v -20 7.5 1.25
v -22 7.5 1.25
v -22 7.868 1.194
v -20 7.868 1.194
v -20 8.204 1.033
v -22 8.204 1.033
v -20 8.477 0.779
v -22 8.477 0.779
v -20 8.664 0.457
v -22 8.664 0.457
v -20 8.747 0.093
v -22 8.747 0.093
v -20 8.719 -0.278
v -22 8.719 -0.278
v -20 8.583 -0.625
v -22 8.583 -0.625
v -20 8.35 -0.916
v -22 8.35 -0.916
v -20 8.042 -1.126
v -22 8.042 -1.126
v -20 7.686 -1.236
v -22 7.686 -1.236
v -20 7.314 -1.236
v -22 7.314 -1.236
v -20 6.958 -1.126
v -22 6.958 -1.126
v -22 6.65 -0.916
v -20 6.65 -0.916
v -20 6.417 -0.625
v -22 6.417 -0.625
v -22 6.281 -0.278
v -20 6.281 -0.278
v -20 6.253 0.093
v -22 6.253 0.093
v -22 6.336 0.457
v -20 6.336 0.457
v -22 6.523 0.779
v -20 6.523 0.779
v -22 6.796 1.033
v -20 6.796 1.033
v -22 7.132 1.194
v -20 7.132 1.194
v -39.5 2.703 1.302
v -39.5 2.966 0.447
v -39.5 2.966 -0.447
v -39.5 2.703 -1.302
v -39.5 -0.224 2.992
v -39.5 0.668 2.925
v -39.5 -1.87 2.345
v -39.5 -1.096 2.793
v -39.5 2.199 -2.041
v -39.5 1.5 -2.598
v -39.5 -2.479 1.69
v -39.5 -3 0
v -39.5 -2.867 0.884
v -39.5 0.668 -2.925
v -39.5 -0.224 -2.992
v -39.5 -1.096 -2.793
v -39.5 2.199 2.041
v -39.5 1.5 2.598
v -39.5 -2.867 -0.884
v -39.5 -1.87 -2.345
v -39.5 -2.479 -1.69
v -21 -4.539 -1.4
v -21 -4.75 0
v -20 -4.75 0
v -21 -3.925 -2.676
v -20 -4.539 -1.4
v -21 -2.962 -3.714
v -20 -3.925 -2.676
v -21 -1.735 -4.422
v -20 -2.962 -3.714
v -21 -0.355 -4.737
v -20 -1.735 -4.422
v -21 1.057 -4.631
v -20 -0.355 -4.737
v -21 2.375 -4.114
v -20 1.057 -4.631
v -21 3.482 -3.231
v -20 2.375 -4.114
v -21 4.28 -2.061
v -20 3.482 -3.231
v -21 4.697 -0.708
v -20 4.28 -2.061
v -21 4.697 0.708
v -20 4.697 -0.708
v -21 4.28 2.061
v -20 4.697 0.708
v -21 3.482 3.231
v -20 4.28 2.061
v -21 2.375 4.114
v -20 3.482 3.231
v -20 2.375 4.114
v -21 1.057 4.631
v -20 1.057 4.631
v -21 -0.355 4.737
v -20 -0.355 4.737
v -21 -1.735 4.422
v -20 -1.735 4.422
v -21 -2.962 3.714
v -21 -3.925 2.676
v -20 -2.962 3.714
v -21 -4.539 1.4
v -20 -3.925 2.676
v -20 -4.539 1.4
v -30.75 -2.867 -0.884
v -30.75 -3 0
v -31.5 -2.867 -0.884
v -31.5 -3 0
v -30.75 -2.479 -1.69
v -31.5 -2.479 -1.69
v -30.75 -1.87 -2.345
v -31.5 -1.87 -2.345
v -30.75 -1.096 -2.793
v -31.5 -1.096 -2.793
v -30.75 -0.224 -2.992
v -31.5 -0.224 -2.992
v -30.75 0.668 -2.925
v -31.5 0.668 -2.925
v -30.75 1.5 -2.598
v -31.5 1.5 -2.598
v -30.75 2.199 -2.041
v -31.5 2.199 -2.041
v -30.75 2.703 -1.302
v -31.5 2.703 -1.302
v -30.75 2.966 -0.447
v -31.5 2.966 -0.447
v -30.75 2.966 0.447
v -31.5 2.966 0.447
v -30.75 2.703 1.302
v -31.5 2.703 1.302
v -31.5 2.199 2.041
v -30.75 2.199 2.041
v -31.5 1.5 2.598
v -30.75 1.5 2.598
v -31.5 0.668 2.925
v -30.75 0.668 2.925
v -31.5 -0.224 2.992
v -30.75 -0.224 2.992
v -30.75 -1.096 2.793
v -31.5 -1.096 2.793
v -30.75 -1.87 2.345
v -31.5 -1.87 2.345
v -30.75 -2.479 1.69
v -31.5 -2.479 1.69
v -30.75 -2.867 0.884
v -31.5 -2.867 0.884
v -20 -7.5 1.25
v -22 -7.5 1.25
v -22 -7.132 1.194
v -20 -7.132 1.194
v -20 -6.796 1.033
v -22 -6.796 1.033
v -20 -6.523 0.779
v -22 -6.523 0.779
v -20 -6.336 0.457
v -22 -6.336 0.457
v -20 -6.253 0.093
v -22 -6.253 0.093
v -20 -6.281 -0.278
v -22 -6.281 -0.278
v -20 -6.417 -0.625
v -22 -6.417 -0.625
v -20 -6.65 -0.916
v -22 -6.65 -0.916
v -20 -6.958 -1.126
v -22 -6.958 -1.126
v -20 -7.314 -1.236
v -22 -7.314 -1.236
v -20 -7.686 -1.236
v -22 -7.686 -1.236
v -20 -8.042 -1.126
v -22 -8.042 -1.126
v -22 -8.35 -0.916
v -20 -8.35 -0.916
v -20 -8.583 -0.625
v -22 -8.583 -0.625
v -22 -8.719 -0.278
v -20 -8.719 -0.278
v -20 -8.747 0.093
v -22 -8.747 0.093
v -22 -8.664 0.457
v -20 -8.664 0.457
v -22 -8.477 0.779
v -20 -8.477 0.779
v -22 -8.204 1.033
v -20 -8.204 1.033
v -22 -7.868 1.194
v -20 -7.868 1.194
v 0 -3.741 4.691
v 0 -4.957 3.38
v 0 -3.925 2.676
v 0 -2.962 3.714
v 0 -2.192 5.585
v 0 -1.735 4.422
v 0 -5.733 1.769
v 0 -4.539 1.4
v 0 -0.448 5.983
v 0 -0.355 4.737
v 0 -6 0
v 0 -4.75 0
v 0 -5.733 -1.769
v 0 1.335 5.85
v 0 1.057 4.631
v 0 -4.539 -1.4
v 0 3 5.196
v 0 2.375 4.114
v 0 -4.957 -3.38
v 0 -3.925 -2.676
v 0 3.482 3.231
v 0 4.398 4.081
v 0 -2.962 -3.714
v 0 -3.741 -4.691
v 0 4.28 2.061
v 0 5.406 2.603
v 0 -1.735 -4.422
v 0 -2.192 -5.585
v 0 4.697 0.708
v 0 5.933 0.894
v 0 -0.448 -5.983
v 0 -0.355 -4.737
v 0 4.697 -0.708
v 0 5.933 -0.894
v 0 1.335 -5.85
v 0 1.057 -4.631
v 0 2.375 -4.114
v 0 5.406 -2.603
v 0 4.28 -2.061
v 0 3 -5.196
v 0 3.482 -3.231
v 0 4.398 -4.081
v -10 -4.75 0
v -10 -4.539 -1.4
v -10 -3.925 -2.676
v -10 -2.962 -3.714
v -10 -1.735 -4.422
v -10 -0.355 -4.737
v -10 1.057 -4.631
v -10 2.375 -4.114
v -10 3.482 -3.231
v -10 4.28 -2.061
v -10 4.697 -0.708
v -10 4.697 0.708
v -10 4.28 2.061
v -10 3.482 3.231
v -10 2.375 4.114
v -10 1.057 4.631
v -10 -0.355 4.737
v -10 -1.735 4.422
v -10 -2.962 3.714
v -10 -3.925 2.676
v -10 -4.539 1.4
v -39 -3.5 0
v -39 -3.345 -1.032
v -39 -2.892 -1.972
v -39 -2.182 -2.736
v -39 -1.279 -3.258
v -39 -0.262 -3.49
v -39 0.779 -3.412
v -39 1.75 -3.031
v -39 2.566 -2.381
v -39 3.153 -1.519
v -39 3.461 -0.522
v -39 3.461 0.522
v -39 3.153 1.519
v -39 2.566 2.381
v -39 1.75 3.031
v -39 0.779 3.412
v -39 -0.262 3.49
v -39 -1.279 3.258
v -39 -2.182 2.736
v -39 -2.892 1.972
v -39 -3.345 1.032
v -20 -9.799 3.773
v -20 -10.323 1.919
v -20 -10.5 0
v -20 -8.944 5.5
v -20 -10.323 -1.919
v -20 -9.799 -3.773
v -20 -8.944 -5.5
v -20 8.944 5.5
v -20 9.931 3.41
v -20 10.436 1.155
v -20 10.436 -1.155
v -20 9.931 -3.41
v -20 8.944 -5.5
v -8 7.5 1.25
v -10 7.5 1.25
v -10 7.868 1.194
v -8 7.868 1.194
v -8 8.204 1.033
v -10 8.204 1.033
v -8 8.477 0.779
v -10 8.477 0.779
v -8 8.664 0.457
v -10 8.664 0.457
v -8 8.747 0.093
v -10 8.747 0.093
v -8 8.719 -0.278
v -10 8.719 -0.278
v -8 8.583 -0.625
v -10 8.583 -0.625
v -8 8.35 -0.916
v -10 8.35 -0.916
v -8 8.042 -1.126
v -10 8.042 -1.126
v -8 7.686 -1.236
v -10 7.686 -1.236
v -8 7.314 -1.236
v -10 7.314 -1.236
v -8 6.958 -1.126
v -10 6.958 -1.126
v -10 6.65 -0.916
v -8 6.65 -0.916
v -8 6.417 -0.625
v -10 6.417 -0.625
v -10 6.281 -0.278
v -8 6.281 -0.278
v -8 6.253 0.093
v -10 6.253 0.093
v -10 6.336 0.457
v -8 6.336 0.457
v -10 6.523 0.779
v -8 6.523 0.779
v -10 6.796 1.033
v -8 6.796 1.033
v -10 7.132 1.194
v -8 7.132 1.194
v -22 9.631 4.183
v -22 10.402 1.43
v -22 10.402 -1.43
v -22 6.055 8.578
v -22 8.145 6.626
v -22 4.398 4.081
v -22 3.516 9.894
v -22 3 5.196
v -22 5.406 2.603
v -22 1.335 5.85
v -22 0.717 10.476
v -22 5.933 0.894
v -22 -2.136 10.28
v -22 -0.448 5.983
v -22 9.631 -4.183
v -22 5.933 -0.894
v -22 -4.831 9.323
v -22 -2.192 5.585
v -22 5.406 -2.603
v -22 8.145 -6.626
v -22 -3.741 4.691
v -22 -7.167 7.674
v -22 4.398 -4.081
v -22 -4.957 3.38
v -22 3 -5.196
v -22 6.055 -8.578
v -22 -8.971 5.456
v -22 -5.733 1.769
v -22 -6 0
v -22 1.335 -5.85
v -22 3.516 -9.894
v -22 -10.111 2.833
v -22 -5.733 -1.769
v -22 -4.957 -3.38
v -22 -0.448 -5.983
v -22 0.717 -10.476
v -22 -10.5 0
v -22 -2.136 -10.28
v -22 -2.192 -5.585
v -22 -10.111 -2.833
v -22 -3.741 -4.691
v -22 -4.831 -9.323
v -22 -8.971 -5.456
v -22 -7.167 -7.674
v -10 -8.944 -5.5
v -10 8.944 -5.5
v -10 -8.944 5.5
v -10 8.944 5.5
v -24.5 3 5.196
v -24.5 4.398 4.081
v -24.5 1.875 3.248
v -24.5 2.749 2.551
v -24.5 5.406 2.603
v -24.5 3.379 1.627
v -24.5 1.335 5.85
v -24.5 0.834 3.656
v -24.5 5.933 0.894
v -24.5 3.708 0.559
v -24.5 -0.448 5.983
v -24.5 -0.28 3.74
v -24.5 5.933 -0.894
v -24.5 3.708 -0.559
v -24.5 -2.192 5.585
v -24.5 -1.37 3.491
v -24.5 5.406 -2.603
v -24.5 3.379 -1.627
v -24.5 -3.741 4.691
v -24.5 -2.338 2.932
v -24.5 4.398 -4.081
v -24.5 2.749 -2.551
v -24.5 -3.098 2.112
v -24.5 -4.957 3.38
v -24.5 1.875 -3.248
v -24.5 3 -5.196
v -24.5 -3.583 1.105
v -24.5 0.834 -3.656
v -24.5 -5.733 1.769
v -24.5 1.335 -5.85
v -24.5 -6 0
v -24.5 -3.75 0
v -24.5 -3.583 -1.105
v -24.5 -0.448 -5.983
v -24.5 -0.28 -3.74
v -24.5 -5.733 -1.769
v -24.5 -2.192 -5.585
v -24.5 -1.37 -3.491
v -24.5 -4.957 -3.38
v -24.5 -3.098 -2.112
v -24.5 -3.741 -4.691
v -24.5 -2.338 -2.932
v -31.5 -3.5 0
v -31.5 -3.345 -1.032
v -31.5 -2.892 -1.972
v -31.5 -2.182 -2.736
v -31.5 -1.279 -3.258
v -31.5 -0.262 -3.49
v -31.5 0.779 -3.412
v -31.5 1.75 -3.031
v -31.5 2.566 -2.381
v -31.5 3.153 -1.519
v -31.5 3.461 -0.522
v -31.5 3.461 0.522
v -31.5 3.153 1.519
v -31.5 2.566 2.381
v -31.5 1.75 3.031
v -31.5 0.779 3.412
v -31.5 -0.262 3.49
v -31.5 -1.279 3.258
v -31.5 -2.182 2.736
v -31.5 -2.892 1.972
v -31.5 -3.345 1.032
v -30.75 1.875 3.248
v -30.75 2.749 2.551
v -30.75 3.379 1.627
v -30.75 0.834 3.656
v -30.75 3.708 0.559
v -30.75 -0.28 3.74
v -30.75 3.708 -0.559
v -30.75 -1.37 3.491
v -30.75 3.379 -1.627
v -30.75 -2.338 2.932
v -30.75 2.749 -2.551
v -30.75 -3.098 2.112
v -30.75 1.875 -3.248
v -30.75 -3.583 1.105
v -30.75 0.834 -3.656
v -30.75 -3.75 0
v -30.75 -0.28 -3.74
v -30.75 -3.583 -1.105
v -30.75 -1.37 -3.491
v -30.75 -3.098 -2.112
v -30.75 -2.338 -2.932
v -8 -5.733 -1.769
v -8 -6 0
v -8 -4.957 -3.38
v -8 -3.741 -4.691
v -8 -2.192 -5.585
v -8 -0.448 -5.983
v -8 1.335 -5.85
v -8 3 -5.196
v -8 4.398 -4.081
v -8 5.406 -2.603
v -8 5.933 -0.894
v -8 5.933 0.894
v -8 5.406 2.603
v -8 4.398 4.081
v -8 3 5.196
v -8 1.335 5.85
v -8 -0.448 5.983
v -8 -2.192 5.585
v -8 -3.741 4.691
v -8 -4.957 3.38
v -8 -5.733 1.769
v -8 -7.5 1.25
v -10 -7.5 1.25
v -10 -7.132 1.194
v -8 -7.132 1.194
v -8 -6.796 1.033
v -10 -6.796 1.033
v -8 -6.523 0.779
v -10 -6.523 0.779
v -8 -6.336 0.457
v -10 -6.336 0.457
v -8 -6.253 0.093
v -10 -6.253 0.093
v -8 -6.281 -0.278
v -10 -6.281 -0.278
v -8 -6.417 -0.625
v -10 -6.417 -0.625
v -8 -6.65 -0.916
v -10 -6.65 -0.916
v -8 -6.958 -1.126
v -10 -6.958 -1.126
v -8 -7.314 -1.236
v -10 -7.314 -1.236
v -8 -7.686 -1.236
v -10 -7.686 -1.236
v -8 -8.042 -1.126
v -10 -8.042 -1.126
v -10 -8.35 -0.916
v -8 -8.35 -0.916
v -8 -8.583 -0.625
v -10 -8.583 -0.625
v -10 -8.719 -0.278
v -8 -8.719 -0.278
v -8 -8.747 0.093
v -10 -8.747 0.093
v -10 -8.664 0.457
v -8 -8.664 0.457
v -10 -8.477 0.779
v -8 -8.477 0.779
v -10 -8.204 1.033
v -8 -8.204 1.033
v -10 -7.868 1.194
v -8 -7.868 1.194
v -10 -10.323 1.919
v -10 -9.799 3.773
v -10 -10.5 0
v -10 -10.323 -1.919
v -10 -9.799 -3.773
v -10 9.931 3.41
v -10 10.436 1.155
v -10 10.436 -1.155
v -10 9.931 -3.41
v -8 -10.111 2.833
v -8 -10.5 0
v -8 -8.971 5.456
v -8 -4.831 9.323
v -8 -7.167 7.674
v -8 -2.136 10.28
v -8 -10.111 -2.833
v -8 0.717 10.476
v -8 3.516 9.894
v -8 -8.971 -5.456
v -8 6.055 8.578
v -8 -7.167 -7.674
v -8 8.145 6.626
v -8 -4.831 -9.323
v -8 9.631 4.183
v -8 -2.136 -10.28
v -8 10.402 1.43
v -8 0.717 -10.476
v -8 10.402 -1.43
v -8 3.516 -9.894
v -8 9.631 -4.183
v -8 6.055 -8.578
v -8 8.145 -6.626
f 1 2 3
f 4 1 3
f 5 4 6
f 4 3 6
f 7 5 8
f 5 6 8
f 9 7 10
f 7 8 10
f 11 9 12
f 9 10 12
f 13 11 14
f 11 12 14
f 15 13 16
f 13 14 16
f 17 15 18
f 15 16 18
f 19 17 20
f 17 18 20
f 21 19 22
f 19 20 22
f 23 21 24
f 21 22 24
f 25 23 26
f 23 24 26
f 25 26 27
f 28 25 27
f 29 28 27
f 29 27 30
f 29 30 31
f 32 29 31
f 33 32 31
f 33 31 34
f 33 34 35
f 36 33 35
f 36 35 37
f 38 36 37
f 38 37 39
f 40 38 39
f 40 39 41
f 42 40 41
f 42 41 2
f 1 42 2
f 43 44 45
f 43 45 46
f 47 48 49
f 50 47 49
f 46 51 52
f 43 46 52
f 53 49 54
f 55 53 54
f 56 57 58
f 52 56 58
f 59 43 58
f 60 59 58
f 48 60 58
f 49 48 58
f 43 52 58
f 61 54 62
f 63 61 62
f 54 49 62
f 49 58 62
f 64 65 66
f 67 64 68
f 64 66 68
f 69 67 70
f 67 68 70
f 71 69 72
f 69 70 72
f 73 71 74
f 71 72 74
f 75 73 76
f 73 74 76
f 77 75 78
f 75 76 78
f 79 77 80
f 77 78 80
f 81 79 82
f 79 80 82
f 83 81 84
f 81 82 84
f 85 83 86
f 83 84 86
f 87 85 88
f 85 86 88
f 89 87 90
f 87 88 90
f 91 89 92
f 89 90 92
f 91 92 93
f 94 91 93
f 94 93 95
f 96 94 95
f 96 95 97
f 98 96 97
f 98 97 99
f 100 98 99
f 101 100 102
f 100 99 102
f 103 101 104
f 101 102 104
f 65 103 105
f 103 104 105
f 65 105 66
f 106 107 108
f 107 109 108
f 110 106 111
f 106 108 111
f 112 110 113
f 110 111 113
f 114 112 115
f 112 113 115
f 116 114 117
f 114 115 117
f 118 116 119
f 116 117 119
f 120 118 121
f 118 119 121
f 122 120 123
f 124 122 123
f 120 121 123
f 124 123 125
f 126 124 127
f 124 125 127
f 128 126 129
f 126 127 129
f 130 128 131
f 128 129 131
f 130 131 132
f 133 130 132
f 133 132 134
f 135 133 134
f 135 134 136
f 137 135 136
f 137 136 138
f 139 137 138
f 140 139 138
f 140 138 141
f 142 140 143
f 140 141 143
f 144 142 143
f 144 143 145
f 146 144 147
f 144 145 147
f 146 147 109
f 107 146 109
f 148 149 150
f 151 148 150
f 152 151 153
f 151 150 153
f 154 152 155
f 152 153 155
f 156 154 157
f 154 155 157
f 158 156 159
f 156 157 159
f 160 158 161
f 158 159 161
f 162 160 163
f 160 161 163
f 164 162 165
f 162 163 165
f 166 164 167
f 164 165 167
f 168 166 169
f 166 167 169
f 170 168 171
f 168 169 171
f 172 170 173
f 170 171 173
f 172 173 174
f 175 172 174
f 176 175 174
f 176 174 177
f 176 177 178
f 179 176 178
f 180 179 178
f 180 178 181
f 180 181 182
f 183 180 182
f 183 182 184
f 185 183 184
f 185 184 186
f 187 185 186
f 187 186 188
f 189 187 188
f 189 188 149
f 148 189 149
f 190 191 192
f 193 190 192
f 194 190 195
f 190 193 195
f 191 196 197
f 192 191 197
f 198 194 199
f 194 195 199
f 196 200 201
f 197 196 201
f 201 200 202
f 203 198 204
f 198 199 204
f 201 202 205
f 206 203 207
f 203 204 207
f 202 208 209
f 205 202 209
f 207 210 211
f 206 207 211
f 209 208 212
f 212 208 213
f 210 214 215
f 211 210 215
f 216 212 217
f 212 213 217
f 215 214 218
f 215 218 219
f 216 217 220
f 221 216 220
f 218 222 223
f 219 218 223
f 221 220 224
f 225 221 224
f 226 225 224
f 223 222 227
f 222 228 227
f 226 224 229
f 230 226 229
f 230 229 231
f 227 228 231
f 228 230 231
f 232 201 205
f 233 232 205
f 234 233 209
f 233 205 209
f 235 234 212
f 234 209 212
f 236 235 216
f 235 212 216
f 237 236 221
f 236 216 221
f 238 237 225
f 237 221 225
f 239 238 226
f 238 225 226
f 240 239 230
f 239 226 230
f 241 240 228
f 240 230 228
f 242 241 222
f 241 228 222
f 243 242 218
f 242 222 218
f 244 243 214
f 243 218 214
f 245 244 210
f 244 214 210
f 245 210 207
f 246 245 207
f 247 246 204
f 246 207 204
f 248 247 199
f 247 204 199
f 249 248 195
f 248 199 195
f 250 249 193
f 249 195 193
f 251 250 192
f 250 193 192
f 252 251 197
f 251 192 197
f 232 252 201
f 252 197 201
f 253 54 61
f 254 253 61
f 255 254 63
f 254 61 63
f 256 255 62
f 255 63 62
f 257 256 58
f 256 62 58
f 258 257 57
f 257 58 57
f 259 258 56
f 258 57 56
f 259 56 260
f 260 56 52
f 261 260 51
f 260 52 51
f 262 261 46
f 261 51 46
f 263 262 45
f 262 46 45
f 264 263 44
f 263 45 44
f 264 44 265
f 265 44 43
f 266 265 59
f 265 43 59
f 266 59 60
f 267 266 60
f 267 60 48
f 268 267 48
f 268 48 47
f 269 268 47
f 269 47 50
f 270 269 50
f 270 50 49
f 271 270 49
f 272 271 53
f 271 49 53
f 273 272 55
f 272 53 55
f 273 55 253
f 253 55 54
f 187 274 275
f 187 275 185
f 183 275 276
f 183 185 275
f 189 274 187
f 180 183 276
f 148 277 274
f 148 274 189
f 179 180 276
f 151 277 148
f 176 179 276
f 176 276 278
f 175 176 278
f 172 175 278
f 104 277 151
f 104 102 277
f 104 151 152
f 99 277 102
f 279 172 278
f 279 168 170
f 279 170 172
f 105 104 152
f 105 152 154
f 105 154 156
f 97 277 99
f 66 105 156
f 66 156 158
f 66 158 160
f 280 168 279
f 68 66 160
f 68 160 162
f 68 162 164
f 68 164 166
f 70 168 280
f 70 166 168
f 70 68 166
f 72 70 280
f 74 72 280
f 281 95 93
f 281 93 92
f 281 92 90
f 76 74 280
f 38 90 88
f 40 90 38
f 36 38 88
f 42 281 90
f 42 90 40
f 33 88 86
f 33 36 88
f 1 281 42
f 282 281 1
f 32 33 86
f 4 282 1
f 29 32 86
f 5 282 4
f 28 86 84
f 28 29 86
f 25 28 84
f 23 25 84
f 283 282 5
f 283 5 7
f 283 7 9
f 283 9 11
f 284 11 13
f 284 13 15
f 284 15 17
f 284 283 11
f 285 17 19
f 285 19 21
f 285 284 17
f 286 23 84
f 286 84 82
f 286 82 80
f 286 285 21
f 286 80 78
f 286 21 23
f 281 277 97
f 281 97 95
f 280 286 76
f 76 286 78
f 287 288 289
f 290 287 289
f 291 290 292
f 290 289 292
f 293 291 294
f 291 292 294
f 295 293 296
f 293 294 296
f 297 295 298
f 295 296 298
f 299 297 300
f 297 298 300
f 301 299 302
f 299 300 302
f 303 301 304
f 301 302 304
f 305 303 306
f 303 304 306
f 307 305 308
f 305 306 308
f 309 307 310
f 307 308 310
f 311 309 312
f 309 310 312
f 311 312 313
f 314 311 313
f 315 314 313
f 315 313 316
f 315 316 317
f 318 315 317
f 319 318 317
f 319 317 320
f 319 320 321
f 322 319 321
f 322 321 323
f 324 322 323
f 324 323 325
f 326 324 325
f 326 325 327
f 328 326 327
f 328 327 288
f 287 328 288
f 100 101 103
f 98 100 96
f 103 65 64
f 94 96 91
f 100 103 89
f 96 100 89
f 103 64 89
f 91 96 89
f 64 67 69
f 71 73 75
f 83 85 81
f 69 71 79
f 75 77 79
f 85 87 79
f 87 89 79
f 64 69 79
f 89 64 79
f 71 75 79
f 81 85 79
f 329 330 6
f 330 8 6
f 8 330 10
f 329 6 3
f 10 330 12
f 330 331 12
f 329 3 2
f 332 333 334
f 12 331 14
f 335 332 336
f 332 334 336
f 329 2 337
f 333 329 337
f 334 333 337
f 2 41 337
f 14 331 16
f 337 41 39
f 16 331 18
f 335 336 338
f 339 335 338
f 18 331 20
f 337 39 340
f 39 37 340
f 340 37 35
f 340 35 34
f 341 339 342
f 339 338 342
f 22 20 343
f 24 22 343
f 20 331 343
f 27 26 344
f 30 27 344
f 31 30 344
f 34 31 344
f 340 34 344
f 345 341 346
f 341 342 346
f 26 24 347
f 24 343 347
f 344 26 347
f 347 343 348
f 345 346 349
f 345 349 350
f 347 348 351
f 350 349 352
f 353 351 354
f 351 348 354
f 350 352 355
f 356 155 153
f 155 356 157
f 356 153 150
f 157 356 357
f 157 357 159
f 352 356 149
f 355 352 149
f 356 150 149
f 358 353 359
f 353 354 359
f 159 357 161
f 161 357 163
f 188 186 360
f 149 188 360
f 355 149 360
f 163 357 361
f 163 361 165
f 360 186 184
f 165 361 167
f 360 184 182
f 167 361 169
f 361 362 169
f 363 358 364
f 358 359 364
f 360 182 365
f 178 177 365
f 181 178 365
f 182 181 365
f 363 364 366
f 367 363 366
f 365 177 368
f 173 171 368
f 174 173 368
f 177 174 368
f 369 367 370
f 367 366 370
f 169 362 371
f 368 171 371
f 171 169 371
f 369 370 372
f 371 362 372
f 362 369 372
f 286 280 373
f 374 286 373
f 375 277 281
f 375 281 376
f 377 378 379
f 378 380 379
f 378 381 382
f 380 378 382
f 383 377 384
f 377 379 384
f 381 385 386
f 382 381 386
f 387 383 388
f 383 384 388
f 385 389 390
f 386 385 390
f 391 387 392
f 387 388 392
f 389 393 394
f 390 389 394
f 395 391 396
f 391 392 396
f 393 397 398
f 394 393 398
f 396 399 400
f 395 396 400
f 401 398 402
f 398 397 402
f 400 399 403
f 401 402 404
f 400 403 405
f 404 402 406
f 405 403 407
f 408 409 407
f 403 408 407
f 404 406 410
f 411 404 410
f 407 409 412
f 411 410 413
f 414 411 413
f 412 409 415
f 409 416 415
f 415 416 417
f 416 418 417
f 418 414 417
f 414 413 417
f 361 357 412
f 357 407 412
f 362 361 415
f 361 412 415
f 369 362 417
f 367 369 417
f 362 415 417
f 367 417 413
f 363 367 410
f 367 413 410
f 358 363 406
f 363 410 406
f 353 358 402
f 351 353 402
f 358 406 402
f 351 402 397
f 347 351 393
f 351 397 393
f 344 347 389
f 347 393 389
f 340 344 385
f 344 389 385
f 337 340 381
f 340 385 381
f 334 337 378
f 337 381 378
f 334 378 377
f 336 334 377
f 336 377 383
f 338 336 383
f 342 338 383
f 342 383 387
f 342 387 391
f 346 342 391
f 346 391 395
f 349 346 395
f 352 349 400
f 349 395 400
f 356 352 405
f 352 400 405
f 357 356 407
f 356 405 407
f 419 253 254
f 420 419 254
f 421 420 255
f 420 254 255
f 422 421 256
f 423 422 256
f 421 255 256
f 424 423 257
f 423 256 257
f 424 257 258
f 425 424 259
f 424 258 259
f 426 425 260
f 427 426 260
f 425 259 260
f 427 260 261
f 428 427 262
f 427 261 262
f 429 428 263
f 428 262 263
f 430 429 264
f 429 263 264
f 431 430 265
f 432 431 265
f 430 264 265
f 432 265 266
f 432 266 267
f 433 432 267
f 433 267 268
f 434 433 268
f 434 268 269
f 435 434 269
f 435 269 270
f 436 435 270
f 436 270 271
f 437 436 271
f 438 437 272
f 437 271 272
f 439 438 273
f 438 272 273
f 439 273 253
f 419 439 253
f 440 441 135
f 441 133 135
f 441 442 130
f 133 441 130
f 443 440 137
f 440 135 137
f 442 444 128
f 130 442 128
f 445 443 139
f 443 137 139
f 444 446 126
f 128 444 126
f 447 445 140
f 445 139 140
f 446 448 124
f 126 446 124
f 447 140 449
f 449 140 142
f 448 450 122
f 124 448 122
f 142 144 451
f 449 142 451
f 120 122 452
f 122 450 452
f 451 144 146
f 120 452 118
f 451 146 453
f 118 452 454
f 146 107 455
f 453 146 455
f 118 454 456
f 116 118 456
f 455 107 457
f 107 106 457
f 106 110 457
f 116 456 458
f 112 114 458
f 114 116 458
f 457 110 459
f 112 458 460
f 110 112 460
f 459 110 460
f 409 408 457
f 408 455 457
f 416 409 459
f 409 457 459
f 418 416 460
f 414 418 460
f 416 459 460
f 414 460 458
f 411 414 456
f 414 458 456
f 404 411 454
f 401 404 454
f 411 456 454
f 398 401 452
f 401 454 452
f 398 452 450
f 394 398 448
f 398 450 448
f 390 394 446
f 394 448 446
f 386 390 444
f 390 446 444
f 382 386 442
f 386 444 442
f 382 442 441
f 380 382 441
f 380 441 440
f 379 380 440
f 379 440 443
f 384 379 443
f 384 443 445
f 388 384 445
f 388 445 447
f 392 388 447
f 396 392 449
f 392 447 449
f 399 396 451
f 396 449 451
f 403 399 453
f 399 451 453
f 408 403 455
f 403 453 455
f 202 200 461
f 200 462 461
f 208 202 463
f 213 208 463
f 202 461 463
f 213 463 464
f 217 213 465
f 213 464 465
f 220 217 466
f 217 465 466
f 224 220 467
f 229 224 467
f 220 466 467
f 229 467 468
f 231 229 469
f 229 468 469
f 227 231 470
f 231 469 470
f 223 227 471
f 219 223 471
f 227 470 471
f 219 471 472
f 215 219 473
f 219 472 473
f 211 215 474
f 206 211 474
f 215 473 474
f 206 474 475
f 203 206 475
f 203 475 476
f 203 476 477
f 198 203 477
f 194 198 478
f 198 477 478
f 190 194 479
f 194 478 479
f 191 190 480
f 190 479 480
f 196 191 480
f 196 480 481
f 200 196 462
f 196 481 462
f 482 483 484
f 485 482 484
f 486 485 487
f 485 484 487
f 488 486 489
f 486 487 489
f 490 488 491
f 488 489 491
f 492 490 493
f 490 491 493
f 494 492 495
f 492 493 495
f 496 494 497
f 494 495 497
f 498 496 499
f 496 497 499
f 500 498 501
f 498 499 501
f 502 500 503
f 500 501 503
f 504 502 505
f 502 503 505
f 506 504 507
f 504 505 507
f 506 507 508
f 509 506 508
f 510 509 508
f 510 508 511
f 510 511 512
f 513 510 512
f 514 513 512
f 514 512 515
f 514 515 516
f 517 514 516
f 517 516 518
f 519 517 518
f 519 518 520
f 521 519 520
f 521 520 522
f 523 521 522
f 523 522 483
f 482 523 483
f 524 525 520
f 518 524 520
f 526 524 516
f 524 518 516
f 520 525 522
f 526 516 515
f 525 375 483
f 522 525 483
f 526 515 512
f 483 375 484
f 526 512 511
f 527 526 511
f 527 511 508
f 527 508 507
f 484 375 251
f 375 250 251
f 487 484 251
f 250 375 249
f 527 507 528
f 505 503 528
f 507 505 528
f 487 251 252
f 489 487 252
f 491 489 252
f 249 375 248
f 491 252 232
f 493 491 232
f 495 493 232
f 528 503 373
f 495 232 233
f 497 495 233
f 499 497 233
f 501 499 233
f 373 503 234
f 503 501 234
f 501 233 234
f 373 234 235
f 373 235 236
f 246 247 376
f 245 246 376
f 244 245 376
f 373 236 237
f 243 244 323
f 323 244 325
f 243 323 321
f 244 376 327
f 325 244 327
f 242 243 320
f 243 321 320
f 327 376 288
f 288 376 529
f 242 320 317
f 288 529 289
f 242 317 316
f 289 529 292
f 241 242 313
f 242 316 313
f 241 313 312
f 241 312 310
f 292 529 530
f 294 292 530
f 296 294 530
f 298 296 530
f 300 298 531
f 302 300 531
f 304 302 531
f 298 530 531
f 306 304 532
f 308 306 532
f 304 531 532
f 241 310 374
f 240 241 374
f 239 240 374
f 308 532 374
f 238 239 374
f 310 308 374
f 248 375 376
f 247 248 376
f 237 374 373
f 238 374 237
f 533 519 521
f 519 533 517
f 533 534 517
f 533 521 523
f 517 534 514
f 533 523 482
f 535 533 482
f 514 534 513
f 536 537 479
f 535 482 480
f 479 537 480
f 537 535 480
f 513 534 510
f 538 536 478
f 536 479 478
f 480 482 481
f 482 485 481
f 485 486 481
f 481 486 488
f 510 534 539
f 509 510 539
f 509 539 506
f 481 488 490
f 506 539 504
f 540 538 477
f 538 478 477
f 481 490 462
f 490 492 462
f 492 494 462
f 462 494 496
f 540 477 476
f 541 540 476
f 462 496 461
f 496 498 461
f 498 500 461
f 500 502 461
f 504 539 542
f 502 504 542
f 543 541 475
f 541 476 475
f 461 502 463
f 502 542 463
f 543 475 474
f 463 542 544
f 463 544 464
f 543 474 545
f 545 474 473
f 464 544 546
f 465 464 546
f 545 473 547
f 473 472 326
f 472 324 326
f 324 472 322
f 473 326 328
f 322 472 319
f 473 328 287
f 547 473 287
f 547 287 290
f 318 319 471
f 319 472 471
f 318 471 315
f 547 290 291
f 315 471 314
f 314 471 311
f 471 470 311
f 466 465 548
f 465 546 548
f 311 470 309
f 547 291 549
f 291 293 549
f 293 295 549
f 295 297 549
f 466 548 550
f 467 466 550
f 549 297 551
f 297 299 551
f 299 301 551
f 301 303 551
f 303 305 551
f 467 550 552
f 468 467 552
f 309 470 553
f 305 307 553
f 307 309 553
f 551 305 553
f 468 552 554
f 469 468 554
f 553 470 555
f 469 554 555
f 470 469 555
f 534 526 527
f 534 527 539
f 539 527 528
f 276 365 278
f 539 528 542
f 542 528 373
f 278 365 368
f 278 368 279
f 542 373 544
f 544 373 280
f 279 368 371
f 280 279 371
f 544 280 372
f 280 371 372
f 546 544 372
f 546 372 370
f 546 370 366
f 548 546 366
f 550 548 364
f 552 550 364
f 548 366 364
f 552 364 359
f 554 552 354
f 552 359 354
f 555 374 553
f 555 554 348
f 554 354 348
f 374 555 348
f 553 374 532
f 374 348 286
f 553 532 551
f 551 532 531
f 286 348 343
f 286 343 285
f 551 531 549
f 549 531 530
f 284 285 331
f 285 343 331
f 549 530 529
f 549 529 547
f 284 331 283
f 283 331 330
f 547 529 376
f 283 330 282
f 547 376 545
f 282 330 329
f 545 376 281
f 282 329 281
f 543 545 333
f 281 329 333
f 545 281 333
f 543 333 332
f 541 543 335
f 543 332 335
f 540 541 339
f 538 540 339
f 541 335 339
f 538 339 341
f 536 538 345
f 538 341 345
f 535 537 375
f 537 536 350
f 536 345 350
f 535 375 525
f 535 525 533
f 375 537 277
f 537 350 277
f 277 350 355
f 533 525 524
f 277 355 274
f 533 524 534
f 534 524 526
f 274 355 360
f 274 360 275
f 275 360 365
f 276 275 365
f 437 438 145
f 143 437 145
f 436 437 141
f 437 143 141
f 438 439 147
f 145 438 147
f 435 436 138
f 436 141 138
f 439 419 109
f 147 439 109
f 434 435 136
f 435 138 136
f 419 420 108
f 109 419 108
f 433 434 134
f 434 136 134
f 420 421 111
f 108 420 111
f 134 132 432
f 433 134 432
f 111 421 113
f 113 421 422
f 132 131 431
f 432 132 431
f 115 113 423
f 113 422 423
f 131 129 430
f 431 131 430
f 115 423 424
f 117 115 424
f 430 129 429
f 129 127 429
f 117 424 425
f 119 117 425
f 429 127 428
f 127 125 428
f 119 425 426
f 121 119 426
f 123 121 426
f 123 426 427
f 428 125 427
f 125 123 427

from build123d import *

# Parameters (mm, degrees)
F_2_5_2_5_DIAMETER_HOLE1_D     = 2.5
CUT_EXTRUDE1_REACH             = 44.199
SKETCH3_W                      = 10
SKETCH3_H                      = 11
CUT_EXTRUDE1_DIRECTION_2_REACH = 44.199
CHAMFER1_SIZE                  = 0.5


with BuildPart() as part:
    # Sketch2 → Revolve1 (revolve)
    with BuildSketch(Plane.XY, mode=Mode.PRIVATE) as revolve1_sk:
        Polygon((0, 4.75), (0, 6), (-8, 6), (-8, 10.5), (-22, 10.5), (-22, 6), (-24.5, 6), (-24.5, 3.75), (-30.75, 3.75), (-30.75, 3), (-31.5, 3), (-31.5, 3.5), (-39.5, 3.5), (-39.5, 0), (-21, 0), (-21, 4.75), align=None)
    revolve(revolve1_sk.sketch.rotate(Axis((-21, 0, 0), (1, 0, 0)), 180), axis=Axis((-21, 0, 0), (1, 0, 0)))

    # Ø2.5 (2.5) Diameter Hole1 (through all)
    with Locations(Plane(origin=(-8, 0, 0), x_dir=(0, 0, -1), z_dir=(1, 0, 0))):
        with Locations((0, 7.5), (0, -7.5)):
            Hole(F_2_5_2_5_DIAMETER_HOLE1_D / 2)

    # Sketch3 → Cut-Extrude1 (cut, up to next)
    with BuildSketch(Plane(origin=(0, 0, 0), x_dir=(1, 0, 0), z_dir=(0, 1, 0)), mode=Mode.PRIVATE) as cut_extrude1_sk1:
        with Locations((-15, 0)):
            Rectangle(SKETCH3_W, SKETCH3_H)
    cut_extrude1_tool1 = extrude(cut_extrude1_sk1.sketch, amount=-CUT_EXTRUDE1_REACH, mode=Mode.PRIVATE) & part.part
    add(cut_extrude1_tool1.solids().sort_by_distance((-15, 0, 0))[0], mode=Mode.SUBTRACT)

    # Sketch3 → Cut-Extrude1 direction 2 (cut, up to next)
    with BuildSketch(Plane(origin=(0, 0, 0), x_dir=(1, 0, 0), z_dir=(0, 1, 0)), mode=Mode.PRIVATE) as cut_extrude1_direction_2_sk1:
        with Locations((-15, 0)):
            Rectangle(SKETCH3_W, SKETCH3_H)
    cut_extrude1_direction_2_tool1 = extrude(cut_extrude1_direction_2_sk1.sketch, amount=CUT_EXTRUDE1_DIRECTION_2_REACH, mode=Mode.PRIVATE) & part.part
    add(cut_extrude1_direction_2_tool1.solids().sort_by_distance((-15, 0, 0))[0], mode=Mode.SUBTRACT)

    # Chamfer1
    chamfer1_edges = [part.edges().sort_by_distance(p)[0] for p in [
        (-39.5, 3.5, 0),
    ]]
    chamfer(chamfer1_edges, length=CHAMFER1_SIZE)


solid = part.part
